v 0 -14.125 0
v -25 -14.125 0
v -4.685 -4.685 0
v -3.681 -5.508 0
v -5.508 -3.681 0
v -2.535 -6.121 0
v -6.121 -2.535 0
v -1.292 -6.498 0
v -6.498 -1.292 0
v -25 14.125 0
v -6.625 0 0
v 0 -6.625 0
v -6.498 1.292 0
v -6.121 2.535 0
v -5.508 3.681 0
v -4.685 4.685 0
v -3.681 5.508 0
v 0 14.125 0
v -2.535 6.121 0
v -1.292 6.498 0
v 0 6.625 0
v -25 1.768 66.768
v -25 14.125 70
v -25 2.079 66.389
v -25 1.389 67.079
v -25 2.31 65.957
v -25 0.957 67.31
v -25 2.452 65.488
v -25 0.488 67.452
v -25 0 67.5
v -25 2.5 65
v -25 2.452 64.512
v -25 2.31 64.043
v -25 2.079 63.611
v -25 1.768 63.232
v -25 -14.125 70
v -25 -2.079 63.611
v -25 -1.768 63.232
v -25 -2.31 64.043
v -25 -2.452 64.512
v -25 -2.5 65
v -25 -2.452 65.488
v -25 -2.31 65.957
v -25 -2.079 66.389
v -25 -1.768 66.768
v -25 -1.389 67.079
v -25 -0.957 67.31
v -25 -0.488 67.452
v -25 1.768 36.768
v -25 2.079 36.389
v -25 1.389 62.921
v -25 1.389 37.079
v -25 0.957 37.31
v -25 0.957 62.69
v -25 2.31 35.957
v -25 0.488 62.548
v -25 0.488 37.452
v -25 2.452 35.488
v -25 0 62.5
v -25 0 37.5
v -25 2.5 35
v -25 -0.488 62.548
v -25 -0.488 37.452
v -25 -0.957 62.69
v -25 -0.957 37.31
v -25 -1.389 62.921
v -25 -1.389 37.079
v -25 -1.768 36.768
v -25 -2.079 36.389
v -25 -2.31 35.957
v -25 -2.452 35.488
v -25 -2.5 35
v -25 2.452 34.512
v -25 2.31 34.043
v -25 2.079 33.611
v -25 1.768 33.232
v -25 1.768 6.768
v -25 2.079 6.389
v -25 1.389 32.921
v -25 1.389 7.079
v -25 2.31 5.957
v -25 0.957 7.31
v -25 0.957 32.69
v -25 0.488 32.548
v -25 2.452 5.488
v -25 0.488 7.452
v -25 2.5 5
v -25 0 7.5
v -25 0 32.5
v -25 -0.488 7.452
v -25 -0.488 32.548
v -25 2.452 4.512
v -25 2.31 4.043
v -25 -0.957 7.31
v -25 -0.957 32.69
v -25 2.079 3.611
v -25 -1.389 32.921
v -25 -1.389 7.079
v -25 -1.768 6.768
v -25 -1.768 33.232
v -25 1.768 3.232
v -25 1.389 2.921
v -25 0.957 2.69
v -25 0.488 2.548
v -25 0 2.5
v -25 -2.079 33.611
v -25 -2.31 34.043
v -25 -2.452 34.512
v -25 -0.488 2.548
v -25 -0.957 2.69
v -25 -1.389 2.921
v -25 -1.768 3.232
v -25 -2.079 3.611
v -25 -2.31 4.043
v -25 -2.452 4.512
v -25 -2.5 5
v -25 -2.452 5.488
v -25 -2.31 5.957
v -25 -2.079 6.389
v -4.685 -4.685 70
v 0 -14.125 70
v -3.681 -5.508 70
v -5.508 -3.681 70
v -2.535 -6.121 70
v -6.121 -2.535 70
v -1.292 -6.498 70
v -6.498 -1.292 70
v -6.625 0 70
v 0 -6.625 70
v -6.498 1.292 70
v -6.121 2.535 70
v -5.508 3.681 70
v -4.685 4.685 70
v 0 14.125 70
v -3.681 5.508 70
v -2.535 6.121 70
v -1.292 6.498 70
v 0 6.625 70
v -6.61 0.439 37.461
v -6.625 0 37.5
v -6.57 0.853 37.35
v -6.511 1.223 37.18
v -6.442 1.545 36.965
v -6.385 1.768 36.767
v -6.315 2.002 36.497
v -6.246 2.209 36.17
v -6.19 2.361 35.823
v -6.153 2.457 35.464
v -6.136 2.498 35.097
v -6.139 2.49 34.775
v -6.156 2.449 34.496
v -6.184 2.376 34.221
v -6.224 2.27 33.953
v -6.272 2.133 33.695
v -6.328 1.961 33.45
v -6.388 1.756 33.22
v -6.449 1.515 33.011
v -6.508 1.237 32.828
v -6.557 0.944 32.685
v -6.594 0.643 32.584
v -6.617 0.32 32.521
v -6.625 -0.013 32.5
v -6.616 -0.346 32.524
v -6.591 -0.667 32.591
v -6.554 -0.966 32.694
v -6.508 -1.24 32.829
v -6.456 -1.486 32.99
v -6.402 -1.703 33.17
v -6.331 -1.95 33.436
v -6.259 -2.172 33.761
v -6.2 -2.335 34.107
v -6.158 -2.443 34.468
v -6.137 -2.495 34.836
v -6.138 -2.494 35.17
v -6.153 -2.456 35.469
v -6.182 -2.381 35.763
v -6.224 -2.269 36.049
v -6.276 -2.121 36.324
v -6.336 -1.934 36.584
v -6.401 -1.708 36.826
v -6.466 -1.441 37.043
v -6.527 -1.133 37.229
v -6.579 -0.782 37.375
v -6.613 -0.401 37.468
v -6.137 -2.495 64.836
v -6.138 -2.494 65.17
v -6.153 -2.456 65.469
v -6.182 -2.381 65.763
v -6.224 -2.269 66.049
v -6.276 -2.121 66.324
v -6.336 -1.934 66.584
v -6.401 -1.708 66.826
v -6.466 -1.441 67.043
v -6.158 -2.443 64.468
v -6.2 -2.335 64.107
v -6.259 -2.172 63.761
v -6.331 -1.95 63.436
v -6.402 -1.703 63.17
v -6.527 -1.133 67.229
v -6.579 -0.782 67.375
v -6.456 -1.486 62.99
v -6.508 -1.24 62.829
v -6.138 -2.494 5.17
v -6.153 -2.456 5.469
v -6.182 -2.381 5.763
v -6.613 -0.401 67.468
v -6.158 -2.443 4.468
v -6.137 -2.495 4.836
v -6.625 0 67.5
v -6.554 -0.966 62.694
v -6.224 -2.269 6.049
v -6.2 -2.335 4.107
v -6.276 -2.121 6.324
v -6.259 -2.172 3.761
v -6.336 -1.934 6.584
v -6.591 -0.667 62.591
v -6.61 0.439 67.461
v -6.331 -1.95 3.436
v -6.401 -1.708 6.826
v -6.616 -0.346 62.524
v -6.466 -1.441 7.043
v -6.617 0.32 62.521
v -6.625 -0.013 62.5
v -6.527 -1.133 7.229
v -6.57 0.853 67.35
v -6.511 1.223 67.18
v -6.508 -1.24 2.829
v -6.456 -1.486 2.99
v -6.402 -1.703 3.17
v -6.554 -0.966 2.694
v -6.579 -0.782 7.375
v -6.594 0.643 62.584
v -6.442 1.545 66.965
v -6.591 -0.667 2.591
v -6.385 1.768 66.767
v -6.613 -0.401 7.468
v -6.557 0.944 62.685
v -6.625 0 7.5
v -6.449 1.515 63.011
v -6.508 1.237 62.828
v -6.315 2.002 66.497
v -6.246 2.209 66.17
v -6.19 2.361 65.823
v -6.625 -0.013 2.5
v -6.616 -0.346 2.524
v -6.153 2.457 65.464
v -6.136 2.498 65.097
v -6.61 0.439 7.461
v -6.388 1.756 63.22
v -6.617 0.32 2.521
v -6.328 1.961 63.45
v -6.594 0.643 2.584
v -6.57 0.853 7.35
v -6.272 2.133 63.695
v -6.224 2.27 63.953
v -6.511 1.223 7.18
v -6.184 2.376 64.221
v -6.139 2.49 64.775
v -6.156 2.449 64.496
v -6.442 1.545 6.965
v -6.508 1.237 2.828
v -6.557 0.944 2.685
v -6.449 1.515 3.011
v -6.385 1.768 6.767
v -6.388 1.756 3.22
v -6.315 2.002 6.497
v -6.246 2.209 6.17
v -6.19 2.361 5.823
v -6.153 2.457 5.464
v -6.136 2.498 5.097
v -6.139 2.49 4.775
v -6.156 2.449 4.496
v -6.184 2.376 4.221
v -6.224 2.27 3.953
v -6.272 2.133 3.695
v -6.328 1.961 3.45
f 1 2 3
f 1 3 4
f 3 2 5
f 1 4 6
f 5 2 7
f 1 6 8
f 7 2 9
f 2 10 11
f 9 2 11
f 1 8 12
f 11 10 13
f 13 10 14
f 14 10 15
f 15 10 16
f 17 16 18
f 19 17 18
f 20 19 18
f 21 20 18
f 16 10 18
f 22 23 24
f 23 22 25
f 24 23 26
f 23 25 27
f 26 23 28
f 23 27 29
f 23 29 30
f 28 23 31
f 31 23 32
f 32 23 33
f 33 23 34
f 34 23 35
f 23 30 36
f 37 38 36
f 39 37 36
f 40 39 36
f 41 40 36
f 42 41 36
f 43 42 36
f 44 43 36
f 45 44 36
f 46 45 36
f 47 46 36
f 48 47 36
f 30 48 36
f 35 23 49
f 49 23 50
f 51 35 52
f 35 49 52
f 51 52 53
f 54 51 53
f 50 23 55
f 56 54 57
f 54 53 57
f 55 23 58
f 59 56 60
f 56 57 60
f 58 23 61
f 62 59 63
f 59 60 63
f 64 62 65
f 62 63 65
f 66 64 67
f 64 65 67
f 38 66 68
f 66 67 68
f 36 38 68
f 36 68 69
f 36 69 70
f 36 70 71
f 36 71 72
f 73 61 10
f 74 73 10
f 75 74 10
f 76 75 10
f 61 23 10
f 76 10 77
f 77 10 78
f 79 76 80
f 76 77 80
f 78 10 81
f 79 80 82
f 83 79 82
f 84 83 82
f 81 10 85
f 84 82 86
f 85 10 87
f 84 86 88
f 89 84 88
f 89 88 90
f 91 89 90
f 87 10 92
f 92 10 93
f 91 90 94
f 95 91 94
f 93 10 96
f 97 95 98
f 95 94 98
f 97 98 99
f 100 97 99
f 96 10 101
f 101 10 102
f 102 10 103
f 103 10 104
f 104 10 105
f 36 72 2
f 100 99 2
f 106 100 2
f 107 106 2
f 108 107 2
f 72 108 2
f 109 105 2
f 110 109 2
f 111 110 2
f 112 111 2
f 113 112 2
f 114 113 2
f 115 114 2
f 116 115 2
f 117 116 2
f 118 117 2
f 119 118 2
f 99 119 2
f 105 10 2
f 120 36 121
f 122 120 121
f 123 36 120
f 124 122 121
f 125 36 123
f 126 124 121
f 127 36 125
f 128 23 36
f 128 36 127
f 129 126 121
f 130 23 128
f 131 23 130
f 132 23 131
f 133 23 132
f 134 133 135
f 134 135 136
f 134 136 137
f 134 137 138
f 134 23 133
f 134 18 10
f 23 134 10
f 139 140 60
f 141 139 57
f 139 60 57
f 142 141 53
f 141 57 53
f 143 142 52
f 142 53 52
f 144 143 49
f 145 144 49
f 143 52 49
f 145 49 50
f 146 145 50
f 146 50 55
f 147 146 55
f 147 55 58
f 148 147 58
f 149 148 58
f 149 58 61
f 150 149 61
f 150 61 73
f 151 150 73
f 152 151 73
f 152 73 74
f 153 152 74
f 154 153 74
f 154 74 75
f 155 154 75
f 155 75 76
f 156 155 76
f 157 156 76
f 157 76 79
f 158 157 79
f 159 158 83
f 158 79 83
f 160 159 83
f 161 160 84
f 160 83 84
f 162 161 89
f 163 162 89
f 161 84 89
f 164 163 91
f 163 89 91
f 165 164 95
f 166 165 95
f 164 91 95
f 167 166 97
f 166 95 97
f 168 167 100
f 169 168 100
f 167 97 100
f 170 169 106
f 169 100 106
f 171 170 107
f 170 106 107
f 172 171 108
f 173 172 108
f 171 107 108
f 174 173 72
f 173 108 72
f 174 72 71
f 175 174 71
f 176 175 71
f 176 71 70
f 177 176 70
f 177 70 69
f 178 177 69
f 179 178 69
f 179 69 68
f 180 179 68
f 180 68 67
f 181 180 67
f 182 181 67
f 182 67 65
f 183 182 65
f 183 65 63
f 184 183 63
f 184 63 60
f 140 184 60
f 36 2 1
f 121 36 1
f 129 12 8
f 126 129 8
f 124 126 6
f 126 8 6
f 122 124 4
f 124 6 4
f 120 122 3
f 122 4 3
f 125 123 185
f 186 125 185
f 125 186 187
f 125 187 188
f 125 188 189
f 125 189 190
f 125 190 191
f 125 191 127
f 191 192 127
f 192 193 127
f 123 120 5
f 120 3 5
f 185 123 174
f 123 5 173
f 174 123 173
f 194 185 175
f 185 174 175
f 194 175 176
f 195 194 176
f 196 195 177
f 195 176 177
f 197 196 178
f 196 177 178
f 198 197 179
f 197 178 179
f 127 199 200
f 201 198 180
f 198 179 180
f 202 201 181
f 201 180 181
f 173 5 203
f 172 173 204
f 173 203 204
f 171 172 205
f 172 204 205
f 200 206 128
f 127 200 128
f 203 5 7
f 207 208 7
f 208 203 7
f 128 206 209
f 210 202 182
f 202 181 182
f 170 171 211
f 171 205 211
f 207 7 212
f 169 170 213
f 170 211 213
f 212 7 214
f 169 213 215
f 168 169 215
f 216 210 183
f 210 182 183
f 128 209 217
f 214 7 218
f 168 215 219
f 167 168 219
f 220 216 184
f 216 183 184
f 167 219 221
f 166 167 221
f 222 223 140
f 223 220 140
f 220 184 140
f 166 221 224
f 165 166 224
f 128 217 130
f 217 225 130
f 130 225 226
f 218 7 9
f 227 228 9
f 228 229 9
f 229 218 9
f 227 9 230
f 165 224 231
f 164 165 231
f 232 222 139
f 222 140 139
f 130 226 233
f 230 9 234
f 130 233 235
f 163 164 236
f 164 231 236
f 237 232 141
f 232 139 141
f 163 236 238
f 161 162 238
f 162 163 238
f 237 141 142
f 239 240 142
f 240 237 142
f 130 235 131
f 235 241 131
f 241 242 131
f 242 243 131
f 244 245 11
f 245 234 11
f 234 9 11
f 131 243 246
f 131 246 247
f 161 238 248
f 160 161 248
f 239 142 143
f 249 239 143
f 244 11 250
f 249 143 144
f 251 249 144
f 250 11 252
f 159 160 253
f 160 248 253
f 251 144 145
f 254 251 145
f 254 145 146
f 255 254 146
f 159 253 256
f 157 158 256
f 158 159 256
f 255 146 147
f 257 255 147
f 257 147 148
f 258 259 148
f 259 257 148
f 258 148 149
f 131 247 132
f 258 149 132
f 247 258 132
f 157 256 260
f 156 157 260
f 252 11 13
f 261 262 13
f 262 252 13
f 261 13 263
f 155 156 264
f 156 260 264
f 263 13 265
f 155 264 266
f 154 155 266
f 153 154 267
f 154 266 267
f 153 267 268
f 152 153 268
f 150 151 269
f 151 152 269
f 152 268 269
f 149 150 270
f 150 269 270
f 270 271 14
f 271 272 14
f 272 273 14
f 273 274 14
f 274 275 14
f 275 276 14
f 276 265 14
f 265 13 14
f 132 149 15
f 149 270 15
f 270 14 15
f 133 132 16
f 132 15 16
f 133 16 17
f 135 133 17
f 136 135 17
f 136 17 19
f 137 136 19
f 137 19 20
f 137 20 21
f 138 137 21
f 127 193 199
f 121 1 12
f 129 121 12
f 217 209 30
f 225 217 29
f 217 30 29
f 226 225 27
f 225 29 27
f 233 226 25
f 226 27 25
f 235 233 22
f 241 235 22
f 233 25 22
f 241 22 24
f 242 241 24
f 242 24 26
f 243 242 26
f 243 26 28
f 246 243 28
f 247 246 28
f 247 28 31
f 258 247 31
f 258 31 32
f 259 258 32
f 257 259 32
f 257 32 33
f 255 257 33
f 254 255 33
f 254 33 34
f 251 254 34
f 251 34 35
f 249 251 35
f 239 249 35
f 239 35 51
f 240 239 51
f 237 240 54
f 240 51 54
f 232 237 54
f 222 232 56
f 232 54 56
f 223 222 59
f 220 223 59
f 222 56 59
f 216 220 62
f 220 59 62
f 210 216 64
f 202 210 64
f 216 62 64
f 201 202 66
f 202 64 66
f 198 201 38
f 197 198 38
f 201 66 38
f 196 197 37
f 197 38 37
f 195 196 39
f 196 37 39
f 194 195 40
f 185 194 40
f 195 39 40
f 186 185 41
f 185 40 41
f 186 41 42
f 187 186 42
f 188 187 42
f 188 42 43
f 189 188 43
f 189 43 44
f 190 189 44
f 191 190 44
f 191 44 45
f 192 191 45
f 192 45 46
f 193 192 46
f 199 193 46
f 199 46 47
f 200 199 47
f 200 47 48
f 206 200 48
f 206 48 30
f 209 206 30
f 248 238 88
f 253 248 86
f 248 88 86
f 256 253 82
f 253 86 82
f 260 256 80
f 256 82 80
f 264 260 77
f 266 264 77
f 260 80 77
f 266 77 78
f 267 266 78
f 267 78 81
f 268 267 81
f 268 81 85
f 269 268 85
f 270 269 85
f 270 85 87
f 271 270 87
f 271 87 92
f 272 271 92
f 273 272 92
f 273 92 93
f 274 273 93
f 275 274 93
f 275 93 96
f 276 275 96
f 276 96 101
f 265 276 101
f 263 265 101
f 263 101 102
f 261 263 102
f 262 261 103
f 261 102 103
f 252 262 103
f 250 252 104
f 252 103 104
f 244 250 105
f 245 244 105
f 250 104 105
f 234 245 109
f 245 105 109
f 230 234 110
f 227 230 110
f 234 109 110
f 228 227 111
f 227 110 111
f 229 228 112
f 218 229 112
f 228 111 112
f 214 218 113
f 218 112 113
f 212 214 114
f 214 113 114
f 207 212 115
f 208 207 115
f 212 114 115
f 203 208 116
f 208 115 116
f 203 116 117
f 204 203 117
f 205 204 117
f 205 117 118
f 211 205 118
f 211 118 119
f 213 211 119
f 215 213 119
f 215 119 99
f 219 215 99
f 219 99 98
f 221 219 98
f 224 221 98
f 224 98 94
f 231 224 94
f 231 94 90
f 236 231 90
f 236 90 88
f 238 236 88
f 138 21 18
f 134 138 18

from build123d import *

# Parameters (mm, degrees)
BOSS_EXTRUDE1_DEPTH = 70
SKETCH2_R           = 2.5
CUT_EXTRUDE1_DEPTH  = 76.660528844


with BuildPart() as part:
    # Sketch1 → Boss-Extrude1 (new body)
    with BuildSketch(Plane.XY):
        with BuildLine():
            Line((0, 6.625), (0, 14.125))
            Line((0, 14.125), (-25, 14.125))
            Line((-25, 14.125), (-25, -14.125))
            Line((-25, -14.125), (0, -14.125))
            Line((0, -14.125), (0, -6.625))
            ThreePointArc((0, -6.625), (-6.625, 0), (0, 6.625))
        make_face()
    extrude(amount=BOSS_EXTRUDE1_DEPTH)

    # Sketch2 → Cut-Extrude1 (cut, through all)
    with BuildSketch(Plane.ZY.offset(25)):
        with Locations((5, 0)):
            Circle(SKETCH2_R)
        with Locations((35, 0)):
            Circle(SKETCH2_R)
        with Locations((65, 0)):
            Circle(SKETCH2_R)
    extrude(amount=-CUT_EXTRUDE1_DEPTH, mode=Mode.SUBTRACT)


solid = part.part
